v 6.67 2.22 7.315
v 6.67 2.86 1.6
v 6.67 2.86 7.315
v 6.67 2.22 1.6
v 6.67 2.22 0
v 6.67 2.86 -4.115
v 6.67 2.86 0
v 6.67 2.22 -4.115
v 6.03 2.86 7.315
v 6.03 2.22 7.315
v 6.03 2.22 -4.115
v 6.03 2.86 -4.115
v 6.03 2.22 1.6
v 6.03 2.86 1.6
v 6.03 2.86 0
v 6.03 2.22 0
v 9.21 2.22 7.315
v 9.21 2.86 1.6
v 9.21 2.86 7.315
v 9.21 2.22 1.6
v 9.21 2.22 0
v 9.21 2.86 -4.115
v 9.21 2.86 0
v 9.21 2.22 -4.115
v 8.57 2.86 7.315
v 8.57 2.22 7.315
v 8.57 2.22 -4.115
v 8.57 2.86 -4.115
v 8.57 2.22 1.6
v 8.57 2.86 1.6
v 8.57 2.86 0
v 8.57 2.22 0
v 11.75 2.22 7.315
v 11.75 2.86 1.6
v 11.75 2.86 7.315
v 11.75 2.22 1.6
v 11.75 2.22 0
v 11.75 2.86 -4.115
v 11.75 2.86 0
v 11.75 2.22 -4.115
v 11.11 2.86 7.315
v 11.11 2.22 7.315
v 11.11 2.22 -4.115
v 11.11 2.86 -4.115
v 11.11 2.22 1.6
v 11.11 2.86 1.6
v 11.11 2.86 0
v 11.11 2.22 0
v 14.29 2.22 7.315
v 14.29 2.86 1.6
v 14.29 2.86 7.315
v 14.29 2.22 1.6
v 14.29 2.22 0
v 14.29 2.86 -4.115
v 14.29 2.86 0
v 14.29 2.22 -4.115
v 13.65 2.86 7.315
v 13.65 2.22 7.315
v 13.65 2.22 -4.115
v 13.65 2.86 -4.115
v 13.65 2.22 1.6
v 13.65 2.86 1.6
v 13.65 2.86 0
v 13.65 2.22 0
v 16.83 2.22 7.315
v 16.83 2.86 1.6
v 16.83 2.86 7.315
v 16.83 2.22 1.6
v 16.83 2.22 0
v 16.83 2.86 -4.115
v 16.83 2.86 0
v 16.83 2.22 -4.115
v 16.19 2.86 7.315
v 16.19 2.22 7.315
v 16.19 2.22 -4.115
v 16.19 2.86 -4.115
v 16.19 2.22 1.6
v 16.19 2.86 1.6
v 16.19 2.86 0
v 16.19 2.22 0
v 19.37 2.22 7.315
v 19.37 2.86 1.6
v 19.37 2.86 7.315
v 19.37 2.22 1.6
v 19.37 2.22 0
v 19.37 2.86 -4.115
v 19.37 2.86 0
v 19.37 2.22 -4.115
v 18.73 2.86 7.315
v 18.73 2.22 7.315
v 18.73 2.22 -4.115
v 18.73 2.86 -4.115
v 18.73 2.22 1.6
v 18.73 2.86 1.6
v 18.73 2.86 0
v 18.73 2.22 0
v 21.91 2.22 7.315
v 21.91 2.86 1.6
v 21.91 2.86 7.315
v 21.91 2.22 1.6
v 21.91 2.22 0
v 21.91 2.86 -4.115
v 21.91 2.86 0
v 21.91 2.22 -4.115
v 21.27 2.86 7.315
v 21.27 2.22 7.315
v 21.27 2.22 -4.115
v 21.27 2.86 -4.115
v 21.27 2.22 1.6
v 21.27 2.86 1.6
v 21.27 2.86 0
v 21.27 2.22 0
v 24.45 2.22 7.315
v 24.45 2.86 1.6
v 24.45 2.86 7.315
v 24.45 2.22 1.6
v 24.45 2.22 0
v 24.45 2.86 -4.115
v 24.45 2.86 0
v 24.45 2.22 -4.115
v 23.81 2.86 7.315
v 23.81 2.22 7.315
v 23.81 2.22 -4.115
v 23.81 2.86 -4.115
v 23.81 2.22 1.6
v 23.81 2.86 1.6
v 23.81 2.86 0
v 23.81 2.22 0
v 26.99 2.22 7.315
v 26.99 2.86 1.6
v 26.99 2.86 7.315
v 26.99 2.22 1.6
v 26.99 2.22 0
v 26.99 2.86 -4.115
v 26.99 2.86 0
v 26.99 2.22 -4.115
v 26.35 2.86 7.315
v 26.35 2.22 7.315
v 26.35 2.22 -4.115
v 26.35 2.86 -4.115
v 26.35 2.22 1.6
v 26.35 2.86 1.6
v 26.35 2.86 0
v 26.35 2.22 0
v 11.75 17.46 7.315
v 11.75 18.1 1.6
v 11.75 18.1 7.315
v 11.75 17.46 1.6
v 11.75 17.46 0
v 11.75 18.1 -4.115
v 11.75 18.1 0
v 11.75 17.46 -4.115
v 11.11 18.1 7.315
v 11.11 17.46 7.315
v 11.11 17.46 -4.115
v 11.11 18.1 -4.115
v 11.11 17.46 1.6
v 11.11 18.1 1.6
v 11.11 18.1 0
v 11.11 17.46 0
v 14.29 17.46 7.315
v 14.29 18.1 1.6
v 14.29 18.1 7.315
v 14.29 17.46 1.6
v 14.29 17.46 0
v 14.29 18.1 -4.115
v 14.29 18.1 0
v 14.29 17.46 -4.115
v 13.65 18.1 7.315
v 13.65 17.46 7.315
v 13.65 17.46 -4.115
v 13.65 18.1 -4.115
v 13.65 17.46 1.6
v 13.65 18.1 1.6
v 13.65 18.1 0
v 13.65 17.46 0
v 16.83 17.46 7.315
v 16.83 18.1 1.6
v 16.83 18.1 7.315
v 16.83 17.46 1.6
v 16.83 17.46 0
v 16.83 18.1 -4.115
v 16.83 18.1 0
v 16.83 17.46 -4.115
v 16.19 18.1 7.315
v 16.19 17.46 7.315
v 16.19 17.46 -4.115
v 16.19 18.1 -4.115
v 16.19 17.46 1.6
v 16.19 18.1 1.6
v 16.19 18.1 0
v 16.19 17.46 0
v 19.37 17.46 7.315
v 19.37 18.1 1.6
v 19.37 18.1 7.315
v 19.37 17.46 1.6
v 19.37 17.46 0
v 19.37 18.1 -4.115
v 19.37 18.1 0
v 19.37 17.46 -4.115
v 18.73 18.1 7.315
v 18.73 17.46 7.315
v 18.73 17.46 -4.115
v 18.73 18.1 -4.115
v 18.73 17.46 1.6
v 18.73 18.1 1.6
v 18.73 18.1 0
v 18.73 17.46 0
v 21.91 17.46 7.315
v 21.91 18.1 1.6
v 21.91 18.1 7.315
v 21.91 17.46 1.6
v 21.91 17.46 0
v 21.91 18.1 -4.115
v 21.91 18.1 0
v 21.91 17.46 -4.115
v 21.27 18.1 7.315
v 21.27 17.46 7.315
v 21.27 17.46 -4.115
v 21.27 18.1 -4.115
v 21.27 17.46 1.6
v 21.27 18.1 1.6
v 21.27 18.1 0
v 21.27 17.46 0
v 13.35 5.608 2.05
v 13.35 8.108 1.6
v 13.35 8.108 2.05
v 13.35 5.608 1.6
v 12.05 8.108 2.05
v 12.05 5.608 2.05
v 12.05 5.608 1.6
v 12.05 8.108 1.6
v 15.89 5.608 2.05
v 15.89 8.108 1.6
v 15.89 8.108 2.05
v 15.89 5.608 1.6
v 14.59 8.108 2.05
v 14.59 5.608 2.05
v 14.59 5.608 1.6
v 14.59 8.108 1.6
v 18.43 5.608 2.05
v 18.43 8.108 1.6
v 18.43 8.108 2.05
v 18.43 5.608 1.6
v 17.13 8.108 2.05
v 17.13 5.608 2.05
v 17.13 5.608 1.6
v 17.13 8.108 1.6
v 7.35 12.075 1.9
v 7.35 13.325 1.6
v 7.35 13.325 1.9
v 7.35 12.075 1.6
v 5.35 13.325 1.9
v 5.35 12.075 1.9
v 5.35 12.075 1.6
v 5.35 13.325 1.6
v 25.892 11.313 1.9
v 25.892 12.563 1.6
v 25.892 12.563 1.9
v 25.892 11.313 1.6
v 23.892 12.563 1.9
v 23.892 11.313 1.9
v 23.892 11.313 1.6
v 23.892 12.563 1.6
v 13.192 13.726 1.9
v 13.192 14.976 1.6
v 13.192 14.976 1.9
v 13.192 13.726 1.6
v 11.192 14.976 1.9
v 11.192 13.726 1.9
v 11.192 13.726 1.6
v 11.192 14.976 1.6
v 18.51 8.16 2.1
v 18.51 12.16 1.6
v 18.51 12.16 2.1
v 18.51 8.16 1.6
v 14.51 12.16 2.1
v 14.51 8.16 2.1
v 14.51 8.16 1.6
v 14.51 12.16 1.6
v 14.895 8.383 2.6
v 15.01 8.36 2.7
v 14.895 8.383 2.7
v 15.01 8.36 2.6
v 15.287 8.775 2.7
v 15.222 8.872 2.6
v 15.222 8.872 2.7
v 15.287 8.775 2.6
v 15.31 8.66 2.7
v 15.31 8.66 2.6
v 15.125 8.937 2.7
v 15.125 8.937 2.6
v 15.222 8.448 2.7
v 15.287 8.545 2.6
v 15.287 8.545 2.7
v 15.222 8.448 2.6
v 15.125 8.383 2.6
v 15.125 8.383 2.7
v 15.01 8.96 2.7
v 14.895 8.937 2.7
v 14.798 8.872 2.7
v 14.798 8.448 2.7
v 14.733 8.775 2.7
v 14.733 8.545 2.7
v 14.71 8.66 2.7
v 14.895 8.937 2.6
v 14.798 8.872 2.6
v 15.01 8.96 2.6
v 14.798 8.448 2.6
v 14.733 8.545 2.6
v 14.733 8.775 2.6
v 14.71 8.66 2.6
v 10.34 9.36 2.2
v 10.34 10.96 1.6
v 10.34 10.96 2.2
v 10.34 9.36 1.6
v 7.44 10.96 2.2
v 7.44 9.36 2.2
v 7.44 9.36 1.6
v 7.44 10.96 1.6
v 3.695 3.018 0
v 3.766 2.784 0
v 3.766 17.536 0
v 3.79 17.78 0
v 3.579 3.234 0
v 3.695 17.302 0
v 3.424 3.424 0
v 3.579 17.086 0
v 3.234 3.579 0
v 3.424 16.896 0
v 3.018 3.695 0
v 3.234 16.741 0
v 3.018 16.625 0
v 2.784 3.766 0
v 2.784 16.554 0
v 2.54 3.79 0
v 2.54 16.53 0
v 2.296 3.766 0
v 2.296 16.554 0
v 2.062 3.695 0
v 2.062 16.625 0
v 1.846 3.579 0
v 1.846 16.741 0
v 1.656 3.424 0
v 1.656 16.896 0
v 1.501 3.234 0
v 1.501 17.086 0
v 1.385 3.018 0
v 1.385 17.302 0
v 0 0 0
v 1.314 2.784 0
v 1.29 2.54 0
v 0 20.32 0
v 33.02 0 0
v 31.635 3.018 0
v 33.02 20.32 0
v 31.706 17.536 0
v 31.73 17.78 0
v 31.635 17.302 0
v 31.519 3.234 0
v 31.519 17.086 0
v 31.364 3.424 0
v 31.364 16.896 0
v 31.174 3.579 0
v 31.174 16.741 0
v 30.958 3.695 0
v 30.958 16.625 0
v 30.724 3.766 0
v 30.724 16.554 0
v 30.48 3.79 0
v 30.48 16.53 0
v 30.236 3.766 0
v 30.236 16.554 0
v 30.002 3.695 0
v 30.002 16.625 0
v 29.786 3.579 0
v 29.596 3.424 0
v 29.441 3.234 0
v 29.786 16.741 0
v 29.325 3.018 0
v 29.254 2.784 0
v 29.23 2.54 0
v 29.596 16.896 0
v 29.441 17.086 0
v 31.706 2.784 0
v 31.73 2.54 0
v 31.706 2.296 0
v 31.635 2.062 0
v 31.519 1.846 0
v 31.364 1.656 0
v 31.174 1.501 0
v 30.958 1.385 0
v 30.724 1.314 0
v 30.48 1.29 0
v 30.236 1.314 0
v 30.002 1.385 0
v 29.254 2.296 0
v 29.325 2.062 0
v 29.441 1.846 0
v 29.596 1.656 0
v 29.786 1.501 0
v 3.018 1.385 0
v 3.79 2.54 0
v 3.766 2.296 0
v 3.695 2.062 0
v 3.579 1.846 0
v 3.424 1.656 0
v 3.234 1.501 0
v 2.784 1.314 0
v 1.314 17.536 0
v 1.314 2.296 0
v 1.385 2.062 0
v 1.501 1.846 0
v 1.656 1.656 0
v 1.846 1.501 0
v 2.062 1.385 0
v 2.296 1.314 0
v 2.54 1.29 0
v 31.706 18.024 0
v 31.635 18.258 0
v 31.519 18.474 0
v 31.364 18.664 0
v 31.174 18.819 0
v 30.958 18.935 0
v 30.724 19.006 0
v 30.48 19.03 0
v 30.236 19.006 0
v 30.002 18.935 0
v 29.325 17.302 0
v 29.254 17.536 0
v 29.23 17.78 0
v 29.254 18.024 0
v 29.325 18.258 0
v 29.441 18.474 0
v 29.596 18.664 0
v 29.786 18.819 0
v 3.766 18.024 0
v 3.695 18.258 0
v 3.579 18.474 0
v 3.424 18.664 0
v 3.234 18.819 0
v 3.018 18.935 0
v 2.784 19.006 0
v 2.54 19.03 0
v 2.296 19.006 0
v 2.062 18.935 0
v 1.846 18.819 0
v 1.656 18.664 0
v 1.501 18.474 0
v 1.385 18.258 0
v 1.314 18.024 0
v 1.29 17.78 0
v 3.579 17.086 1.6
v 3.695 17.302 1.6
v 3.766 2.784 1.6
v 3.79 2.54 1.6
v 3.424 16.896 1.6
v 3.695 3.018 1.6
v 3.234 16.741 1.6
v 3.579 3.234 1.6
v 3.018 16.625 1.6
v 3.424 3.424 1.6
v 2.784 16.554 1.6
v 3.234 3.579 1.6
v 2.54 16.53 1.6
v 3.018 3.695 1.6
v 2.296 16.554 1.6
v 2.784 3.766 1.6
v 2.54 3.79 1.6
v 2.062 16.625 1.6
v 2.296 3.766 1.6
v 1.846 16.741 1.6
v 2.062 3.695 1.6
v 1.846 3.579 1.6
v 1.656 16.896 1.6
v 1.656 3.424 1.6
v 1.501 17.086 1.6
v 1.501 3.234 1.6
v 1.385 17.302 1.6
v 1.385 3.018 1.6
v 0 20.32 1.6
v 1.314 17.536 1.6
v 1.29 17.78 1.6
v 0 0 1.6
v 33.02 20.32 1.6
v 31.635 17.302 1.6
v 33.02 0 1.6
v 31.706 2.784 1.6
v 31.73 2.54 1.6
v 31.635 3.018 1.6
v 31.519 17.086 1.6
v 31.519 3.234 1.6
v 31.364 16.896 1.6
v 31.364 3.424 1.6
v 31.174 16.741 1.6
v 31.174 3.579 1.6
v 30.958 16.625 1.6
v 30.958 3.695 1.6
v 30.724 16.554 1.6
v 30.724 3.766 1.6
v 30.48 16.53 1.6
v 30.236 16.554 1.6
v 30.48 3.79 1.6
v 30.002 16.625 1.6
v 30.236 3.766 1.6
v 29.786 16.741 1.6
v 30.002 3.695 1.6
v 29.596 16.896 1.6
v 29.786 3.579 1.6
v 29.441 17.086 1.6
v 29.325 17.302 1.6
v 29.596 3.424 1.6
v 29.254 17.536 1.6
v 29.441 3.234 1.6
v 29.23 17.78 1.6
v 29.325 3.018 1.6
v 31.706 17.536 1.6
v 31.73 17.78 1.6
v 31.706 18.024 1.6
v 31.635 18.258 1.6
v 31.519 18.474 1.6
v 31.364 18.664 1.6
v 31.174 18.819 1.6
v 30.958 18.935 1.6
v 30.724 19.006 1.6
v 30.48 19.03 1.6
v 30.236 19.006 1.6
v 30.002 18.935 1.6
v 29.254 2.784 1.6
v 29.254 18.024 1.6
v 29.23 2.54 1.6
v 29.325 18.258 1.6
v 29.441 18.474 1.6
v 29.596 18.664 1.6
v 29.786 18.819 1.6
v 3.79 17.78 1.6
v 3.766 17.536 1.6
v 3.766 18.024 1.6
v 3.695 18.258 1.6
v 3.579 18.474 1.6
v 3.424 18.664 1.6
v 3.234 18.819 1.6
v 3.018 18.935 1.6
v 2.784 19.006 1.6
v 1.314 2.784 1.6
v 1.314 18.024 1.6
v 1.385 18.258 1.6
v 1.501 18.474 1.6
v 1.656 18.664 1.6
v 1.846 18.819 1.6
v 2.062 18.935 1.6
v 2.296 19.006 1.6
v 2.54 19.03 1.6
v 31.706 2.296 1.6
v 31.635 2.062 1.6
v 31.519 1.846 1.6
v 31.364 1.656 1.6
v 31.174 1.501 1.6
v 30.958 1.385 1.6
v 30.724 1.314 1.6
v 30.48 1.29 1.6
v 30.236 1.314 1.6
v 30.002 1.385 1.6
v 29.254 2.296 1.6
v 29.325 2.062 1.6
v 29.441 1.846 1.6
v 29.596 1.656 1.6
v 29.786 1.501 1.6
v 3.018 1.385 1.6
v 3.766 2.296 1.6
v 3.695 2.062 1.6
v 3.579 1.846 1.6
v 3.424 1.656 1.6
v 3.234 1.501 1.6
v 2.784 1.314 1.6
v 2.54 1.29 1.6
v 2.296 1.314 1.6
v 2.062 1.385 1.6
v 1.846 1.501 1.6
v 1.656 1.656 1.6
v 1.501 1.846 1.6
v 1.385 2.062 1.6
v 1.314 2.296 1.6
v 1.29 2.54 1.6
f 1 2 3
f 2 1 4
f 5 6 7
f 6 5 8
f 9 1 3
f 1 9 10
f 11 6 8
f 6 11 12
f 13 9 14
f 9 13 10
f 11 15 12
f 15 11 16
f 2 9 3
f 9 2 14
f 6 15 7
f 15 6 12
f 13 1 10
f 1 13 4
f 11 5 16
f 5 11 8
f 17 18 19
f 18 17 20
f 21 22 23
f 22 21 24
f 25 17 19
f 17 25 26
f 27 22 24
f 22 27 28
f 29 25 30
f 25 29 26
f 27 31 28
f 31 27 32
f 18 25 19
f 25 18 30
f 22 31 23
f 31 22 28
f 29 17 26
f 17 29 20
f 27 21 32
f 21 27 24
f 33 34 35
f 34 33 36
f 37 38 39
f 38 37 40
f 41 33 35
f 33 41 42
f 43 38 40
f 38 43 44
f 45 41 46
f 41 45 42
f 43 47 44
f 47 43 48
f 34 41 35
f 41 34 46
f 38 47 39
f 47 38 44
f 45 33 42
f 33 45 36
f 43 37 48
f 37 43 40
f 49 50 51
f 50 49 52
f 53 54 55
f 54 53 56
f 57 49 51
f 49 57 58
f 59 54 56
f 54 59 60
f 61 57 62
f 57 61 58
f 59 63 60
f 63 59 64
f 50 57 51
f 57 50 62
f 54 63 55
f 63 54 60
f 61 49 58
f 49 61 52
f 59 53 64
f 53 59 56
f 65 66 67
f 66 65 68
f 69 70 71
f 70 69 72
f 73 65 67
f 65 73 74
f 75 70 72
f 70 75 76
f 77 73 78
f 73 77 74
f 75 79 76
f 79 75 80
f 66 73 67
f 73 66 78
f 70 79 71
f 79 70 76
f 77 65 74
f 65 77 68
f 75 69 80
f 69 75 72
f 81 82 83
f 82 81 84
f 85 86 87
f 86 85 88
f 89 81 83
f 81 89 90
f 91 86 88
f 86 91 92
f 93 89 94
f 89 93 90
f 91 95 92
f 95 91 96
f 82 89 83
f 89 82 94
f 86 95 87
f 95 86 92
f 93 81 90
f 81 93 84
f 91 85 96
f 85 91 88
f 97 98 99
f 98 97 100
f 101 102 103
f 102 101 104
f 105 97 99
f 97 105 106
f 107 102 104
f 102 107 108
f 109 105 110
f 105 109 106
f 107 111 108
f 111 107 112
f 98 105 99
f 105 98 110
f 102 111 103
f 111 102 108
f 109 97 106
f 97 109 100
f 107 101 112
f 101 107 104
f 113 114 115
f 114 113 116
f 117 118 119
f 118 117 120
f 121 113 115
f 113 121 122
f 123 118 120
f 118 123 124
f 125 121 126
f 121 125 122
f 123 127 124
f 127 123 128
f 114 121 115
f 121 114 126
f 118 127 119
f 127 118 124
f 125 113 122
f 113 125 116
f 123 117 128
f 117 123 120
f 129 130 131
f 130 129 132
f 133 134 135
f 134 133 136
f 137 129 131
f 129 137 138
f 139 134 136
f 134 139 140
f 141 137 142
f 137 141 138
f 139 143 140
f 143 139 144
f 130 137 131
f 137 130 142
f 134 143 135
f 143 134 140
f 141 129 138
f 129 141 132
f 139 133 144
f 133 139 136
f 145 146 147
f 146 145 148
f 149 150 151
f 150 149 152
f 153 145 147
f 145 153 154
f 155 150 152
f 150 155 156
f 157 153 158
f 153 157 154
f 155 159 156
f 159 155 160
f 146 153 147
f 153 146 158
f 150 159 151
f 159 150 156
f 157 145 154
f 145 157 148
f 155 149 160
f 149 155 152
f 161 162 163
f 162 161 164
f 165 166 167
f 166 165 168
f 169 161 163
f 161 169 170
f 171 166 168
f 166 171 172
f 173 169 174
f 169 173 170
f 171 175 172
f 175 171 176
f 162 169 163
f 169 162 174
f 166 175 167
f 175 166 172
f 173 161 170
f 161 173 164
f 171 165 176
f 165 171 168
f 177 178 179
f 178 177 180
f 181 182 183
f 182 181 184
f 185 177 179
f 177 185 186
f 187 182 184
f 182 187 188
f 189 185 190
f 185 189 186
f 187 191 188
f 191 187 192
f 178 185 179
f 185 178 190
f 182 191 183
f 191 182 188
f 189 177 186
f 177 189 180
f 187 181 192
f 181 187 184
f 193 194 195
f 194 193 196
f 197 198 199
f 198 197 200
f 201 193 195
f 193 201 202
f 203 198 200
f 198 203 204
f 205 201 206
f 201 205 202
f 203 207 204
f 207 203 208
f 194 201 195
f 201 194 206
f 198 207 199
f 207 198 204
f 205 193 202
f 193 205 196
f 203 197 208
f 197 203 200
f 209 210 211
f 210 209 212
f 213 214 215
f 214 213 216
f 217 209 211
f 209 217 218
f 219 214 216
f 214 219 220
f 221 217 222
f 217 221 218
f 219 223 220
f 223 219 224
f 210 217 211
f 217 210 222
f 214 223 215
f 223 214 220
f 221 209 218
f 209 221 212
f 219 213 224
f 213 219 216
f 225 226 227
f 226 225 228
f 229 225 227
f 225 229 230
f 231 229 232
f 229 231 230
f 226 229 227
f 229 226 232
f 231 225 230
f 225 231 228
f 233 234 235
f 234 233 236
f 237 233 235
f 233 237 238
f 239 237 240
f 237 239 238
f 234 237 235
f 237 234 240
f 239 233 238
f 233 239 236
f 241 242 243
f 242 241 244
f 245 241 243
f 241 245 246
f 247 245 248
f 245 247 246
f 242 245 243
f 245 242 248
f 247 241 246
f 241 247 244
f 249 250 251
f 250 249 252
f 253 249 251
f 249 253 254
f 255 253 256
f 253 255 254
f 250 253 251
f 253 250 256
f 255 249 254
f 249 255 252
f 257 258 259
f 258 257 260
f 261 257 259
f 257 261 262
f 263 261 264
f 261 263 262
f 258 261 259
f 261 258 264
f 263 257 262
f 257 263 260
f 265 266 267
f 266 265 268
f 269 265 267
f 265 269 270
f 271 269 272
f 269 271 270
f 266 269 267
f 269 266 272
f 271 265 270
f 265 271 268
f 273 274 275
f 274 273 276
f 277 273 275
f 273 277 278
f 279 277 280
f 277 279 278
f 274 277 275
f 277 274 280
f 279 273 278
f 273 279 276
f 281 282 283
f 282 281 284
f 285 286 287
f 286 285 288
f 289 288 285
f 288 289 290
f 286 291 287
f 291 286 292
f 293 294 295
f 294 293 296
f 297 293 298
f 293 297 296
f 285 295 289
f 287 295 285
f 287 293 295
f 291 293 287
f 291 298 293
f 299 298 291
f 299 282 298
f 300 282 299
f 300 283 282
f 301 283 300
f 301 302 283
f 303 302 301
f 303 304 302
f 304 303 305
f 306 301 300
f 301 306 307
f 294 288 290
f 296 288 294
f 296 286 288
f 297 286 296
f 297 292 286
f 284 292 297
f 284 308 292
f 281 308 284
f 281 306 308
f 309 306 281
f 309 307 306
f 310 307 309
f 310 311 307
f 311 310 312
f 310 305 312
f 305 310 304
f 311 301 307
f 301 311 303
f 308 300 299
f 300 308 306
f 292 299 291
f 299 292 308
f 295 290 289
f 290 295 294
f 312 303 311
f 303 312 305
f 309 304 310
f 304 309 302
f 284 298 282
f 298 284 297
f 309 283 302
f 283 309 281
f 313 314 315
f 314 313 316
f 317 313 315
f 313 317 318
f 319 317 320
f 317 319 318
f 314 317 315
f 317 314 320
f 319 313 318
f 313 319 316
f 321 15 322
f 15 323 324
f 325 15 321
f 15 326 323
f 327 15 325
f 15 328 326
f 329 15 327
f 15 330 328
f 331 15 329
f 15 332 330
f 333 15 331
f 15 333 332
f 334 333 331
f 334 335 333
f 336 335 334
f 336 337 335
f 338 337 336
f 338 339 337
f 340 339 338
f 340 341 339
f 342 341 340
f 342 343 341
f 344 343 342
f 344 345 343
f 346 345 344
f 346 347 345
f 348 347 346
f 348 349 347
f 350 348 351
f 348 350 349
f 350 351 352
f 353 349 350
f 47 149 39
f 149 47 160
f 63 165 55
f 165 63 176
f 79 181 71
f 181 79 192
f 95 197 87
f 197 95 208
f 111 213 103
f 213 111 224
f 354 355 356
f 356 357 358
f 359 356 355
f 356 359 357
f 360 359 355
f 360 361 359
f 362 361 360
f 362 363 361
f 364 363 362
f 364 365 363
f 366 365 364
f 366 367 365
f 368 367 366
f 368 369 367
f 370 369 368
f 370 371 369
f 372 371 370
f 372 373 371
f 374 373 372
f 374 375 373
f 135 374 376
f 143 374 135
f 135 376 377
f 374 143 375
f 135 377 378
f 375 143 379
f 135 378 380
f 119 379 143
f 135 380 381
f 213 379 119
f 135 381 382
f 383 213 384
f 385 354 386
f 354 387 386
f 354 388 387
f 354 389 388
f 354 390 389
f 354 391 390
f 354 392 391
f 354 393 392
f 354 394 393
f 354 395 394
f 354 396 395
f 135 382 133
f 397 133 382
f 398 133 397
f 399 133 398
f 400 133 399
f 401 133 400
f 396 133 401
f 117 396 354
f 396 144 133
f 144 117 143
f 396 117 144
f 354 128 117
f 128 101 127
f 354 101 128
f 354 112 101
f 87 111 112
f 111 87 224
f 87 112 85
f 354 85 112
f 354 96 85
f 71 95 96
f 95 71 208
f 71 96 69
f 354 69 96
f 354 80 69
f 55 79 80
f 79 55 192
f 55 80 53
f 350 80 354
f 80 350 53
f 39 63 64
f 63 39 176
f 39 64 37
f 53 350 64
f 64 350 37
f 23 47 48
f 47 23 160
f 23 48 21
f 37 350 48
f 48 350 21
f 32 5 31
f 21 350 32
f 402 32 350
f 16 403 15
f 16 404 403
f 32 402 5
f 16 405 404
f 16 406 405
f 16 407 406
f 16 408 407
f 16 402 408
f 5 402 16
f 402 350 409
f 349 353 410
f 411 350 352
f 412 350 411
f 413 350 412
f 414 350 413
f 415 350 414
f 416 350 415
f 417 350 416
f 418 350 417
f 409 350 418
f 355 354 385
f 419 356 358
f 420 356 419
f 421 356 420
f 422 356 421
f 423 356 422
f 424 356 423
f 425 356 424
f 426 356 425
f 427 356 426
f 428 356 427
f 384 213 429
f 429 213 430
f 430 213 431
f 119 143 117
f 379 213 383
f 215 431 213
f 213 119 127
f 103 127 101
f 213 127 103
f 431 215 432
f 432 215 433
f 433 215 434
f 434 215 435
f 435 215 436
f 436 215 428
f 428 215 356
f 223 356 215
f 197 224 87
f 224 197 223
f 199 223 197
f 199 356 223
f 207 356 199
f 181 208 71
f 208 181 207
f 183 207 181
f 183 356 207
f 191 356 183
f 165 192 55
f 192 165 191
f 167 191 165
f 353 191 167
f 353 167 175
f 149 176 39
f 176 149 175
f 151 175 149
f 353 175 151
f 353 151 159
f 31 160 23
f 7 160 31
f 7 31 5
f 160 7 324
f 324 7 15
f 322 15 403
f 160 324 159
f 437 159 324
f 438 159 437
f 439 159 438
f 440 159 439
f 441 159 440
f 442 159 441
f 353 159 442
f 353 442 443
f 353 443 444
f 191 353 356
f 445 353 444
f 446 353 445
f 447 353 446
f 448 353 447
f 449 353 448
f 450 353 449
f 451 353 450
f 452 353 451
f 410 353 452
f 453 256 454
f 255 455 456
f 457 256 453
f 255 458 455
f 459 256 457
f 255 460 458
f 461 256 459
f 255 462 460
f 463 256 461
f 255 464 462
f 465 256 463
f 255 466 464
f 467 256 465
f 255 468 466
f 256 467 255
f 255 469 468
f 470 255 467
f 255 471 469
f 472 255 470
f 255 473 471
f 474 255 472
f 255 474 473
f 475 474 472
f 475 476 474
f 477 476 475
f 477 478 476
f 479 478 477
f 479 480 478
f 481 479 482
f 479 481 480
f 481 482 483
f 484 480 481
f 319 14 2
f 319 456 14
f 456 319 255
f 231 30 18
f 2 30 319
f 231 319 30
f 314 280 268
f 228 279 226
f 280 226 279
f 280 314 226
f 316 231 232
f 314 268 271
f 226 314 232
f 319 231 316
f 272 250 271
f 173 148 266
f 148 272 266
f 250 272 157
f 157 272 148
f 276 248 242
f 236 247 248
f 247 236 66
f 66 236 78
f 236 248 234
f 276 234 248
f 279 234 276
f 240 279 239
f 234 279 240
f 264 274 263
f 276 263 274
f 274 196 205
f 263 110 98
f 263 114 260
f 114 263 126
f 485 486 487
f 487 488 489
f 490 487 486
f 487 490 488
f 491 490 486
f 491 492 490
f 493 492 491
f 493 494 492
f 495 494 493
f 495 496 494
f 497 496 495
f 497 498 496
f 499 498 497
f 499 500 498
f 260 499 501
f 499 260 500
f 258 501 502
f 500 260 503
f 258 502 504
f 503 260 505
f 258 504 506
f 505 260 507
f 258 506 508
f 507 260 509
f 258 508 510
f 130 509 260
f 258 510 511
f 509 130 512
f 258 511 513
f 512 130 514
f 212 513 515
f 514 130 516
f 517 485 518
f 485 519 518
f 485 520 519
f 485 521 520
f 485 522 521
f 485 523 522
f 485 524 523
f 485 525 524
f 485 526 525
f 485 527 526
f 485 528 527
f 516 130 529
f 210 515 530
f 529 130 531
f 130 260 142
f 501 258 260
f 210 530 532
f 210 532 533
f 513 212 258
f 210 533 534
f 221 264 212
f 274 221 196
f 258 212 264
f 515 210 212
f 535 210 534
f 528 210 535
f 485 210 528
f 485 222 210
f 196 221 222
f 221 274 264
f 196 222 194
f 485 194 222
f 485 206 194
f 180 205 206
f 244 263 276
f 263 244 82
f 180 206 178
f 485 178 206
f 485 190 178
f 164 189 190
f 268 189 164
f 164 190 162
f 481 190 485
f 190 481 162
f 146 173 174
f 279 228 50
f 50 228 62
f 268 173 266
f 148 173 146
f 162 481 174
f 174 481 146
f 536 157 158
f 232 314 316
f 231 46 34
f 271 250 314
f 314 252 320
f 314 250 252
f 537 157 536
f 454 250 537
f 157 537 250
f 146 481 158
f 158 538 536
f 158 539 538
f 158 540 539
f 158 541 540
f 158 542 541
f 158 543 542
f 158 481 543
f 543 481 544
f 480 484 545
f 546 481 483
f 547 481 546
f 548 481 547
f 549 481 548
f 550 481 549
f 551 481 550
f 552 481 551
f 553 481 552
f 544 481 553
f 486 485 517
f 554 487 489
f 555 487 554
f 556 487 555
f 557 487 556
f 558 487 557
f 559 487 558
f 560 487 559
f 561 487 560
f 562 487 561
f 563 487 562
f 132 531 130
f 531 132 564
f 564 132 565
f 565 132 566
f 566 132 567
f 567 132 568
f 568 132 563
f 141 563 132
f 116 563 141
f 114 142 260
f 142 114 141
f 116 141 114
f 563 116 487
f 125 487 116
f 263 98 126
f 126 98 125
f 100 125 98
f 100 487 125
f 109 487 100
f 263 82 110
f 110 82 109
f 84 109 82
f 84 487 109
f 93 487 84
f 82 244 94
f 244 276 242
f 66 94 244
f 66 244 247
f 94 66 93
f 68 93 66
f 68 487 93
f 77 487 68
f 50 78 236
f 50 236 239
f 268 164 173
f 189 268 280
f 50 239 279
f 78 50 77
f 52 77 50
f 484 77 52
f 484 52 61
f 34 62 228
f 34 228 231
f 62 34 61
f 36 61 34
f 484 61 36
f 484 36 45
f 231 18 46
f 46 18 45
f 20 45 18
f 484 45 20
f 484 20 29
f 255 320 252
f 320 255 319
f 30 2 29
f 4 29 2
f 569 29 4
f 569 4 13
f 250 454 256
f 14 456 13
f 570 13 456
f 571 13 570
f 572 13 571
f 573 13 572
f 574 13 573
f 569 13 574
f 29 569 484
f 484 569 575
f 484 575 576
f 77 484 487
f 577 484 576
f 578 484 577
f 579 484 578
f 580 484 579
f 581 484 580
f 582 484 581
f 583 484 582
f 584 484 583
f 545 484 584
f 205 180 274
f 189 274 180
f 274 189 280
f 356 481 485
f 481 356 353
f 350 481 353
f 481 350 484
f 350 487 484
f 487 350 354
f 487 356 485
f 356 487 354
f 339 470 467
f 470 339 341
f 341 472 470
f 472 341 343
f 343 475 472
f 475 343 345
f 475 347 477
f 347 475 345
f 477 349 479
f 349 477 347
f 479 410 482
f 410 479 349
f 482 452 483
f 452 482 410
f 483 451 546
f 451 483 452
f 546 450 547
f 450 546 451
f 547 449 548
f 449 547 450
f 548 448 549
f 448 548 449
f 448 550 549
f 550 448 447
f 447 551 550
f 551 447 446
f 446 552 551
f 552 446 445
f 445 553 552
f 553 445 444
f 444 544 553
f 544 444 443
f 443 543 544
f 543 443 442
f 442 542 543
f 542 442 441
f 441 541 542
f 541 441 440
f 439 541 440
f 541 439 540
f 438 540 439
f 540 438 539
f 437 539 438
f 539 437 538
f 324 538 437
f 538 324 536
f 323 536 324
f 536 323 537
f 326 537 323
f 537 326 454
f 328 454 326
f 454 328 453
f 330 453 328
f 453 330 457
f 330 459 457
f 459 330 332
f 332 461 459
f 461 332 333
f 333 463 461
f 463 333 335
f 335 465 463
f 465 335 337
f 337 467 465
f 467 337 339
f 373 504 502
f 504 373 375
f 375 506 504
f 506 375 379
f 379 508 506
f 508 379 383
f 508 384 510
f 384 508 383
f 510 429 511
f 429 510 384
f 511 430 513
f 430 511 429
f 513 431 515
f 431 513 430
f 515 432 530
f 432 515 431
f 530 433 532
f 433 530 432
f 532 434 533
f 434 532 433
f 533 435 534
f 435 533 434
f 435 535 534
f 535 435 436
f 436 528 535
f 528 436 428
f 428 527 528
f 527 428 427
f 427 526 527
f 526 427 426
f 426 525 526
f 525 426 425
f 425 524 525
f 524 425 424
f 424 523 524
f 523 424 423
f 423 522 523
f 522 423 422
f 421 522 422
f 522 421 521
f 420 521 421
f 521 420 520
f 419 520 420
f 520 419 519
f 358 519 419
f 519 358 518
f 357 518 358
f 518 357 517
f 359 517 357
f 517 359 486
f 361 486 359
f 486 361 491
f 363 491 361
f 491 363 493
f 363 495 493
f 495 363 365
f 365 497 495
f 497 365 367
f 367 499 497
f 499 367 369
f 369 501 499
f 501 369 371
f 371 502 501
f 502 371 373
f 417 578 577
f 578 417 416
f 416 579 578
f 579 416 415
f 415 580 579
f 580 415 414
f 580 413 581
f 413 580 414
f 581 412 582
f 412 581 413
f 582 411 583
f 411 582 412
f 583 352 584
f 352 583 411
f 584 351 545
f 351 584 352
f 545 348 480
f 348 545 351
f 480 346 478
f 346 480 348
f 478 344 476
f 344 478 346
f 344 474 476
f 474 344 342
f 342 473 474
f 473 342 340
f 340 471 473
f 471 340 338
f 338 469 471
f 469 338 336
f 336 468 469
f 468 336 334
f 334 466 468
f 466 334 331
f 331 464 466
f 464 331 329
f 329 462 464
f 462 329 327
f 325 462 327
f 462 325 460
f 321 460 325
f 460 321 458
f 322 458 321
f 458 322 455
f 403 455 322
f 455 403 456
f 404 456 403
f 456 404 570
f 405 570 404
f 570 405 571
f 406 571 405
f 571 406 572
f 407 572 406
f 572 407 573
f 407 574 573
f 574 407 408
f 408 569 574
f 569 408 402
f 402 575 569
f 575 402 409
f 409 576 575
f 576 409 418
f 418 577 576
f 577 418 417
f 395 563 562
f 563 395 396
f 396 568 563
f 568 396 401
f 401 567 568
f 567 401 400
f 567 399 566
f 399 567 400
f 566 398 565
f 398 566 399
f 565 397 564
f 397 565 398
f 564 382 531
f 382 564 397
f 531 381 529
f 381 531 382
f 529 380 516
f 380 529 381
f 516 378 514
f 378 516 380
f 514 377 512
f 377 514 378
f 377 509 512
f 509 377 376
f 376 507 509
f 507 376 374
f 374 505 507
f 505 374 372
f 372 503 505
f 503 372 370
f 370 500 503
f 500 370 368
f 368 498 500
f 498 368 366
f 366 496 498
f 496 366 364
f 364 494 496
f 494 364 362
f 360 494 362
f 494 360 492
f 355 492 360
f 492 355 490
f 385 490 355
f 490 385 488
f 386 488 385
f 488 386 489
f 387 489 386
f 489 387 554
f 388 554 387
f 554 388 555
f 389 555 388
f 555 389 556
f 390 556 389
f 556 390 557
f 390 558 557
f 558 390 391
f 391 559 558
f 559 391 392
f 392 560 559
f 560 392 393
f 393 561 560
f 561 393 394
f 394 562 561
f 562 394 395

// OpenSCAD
// Adafruit LSM9DS0 9-DOF Breakout Board PCB Model
// Based on Adafruit-LSM9DS0-PCB design files
// https://github.com/adafruit/Adafruit-LSM9DS0-PCB
//
// License: Creative Commons Attribution-ShareAlike 3.0
// Designed by Limor Fried/Ladyada for Adafruit Industries
// OpenSCAD model created for ekf9dof project

// Parameters - all dimensions from Adafruit Eagle PCB files
pcb_length = 33.02;      // X dimension from Eagle board file
pcb_width = 20.32;       // Y dimension from Eagle board file  
pcb_thickness = 1.6;     // Standard PCB thickness
hole_diameter = 2.5;     // Mounting hole drill diameter from .brd file
hole_positions = [
    [2.54, 2.54],        // Bottom left corner
    [30.48, 2.54],       // Bottom right corner
    [2.54, 17.78],       // Top left corner
    [30.48, 17.78]       // Top right corner
];

// Component dimensions (approximated from board layout)
lsm9ds0_chip_size = [4, 4, 1];  // LGA-24 4x4mm package
chip_position = [pcb_length/2, pcb_width/2, pcb_thickness];

// Connector positions (from board file - 1x9 power/IO header and 1x5 SPI header)
header_1x9_position = [16.51, 2.54, pcb_thickness];
header_1x5_position = [16.51, 17.78, pcb_thickness];
pin_size = [0.64, 0.64, 11.43];  // Square pin 0.64mm, 11.43mm height

// Module: Complete Adafruit LSM9DS0 PCB assembly
module adafruit_lsm9ds0_pcb(show_components = true, pcb_color = "#2196F3") {
    
    // PCB base
    difference() {
        union() {
            // Main PCB board
            color(pcb_color)
            linear_extrude(height = pcb_thickness)
            difference() {
                // PCB outline
                square([pcb_length, pcb_width]);
                
                // Mounting holes
                for (pos = hole_positions) {
                    translate(pos)
                    circle(d = hole_diameter, $fn = 32);
                }
            }
        }
    }
    
    if (show_components) {
        // LSM9DS0 IC chip (center of board)
        color("dimgray")
        translate(chip_position)
        cube(lsm9ds0_chip_size, center = true);
        
        // Pin 1 indicator dot
        color("white")
        translate([chip_position[0] - lsm9ds0_chip_size[0]/2 + 0.5, 
                   chip_position[1] - lsm9ds0_chip_size[1]/2 + 0.5, 
                   chip_position[2] + lsm9ds0_chip_size[2]])
        cylinder(d = 0.6, h = 0.1, $fn = 16);
        
        // 1x9 Pin header (bottom - power and GPIO)
        color("black")
        translate(header_1x9_position)
        for (i = [-4:4]) {
            translate([i * 2.54, 0, 0])
            cube(pin_size, center = true);
        }
        
        // 1x5 Pin header (top - SPI interface)
        color("black")
        translate(header_1x5_position)
        for (i = [-2:2]) {
            translate([i * 2.54, 0, 0])
            cube(pin_size, center = true);
        }
        
        // Voltage regulator (approximate position from layout)
        color("darkslategray")
        translate([8.89, 10.16, pcb_thickness])
        cube([2.9, 1.6, 1.2], center = true);
        
        // Level shifter MOSFETs (approximate positions)
        for (x_offset = [12.7, 15.24, 17.78]) {
            color("darkslategray")
            translate([x_offset, 6.858, pcb_thickness])
            cube([1.3, 2.5, 0.9], center = true);
        }
        
        // SMD capacitors and resistors (simplified representation)
        for (pos = [[6.35, 12.7], [24.892, 11.938], [12.192, 14.351]]) {
            color("sienna")
            translate([pos[0], pos[1], pcb_thickness])
            cube([2.0, 1.25, 0.6], center = true);
        }
    }
}

// Render the PCB
adafruit_lsm9ds0_pcb(show_components = true);

// Print board information
echo("=== Adafruit LSM9DS0 PCB ===");
echo(str("Board size: ", pcb_length, "mm x ", pcb_width, "mm x ", pcb_thickness, "mm"));
echo(str("Mounting holes: ", hole_diameter, "mm diameter"));
echo("Mounting hole positions (X, Y):");
for (i = [0:len(hole_positions)-1]) {
    echo(str("  Hole ", i+1, ": (", hole_positions[i][0], ", ", hole_positions[i][1], ")"));
}
echo("Sensor: LSM9DS0 9-DOF (3-axis accelerometer, magnetometer, gyroscope)");
echo("Headers: 1x9 pin (Power/GPIO), 1x5 pin (SPI)");
echo("License: CC-BY-SA 3.0 - Adafruit Industries");
